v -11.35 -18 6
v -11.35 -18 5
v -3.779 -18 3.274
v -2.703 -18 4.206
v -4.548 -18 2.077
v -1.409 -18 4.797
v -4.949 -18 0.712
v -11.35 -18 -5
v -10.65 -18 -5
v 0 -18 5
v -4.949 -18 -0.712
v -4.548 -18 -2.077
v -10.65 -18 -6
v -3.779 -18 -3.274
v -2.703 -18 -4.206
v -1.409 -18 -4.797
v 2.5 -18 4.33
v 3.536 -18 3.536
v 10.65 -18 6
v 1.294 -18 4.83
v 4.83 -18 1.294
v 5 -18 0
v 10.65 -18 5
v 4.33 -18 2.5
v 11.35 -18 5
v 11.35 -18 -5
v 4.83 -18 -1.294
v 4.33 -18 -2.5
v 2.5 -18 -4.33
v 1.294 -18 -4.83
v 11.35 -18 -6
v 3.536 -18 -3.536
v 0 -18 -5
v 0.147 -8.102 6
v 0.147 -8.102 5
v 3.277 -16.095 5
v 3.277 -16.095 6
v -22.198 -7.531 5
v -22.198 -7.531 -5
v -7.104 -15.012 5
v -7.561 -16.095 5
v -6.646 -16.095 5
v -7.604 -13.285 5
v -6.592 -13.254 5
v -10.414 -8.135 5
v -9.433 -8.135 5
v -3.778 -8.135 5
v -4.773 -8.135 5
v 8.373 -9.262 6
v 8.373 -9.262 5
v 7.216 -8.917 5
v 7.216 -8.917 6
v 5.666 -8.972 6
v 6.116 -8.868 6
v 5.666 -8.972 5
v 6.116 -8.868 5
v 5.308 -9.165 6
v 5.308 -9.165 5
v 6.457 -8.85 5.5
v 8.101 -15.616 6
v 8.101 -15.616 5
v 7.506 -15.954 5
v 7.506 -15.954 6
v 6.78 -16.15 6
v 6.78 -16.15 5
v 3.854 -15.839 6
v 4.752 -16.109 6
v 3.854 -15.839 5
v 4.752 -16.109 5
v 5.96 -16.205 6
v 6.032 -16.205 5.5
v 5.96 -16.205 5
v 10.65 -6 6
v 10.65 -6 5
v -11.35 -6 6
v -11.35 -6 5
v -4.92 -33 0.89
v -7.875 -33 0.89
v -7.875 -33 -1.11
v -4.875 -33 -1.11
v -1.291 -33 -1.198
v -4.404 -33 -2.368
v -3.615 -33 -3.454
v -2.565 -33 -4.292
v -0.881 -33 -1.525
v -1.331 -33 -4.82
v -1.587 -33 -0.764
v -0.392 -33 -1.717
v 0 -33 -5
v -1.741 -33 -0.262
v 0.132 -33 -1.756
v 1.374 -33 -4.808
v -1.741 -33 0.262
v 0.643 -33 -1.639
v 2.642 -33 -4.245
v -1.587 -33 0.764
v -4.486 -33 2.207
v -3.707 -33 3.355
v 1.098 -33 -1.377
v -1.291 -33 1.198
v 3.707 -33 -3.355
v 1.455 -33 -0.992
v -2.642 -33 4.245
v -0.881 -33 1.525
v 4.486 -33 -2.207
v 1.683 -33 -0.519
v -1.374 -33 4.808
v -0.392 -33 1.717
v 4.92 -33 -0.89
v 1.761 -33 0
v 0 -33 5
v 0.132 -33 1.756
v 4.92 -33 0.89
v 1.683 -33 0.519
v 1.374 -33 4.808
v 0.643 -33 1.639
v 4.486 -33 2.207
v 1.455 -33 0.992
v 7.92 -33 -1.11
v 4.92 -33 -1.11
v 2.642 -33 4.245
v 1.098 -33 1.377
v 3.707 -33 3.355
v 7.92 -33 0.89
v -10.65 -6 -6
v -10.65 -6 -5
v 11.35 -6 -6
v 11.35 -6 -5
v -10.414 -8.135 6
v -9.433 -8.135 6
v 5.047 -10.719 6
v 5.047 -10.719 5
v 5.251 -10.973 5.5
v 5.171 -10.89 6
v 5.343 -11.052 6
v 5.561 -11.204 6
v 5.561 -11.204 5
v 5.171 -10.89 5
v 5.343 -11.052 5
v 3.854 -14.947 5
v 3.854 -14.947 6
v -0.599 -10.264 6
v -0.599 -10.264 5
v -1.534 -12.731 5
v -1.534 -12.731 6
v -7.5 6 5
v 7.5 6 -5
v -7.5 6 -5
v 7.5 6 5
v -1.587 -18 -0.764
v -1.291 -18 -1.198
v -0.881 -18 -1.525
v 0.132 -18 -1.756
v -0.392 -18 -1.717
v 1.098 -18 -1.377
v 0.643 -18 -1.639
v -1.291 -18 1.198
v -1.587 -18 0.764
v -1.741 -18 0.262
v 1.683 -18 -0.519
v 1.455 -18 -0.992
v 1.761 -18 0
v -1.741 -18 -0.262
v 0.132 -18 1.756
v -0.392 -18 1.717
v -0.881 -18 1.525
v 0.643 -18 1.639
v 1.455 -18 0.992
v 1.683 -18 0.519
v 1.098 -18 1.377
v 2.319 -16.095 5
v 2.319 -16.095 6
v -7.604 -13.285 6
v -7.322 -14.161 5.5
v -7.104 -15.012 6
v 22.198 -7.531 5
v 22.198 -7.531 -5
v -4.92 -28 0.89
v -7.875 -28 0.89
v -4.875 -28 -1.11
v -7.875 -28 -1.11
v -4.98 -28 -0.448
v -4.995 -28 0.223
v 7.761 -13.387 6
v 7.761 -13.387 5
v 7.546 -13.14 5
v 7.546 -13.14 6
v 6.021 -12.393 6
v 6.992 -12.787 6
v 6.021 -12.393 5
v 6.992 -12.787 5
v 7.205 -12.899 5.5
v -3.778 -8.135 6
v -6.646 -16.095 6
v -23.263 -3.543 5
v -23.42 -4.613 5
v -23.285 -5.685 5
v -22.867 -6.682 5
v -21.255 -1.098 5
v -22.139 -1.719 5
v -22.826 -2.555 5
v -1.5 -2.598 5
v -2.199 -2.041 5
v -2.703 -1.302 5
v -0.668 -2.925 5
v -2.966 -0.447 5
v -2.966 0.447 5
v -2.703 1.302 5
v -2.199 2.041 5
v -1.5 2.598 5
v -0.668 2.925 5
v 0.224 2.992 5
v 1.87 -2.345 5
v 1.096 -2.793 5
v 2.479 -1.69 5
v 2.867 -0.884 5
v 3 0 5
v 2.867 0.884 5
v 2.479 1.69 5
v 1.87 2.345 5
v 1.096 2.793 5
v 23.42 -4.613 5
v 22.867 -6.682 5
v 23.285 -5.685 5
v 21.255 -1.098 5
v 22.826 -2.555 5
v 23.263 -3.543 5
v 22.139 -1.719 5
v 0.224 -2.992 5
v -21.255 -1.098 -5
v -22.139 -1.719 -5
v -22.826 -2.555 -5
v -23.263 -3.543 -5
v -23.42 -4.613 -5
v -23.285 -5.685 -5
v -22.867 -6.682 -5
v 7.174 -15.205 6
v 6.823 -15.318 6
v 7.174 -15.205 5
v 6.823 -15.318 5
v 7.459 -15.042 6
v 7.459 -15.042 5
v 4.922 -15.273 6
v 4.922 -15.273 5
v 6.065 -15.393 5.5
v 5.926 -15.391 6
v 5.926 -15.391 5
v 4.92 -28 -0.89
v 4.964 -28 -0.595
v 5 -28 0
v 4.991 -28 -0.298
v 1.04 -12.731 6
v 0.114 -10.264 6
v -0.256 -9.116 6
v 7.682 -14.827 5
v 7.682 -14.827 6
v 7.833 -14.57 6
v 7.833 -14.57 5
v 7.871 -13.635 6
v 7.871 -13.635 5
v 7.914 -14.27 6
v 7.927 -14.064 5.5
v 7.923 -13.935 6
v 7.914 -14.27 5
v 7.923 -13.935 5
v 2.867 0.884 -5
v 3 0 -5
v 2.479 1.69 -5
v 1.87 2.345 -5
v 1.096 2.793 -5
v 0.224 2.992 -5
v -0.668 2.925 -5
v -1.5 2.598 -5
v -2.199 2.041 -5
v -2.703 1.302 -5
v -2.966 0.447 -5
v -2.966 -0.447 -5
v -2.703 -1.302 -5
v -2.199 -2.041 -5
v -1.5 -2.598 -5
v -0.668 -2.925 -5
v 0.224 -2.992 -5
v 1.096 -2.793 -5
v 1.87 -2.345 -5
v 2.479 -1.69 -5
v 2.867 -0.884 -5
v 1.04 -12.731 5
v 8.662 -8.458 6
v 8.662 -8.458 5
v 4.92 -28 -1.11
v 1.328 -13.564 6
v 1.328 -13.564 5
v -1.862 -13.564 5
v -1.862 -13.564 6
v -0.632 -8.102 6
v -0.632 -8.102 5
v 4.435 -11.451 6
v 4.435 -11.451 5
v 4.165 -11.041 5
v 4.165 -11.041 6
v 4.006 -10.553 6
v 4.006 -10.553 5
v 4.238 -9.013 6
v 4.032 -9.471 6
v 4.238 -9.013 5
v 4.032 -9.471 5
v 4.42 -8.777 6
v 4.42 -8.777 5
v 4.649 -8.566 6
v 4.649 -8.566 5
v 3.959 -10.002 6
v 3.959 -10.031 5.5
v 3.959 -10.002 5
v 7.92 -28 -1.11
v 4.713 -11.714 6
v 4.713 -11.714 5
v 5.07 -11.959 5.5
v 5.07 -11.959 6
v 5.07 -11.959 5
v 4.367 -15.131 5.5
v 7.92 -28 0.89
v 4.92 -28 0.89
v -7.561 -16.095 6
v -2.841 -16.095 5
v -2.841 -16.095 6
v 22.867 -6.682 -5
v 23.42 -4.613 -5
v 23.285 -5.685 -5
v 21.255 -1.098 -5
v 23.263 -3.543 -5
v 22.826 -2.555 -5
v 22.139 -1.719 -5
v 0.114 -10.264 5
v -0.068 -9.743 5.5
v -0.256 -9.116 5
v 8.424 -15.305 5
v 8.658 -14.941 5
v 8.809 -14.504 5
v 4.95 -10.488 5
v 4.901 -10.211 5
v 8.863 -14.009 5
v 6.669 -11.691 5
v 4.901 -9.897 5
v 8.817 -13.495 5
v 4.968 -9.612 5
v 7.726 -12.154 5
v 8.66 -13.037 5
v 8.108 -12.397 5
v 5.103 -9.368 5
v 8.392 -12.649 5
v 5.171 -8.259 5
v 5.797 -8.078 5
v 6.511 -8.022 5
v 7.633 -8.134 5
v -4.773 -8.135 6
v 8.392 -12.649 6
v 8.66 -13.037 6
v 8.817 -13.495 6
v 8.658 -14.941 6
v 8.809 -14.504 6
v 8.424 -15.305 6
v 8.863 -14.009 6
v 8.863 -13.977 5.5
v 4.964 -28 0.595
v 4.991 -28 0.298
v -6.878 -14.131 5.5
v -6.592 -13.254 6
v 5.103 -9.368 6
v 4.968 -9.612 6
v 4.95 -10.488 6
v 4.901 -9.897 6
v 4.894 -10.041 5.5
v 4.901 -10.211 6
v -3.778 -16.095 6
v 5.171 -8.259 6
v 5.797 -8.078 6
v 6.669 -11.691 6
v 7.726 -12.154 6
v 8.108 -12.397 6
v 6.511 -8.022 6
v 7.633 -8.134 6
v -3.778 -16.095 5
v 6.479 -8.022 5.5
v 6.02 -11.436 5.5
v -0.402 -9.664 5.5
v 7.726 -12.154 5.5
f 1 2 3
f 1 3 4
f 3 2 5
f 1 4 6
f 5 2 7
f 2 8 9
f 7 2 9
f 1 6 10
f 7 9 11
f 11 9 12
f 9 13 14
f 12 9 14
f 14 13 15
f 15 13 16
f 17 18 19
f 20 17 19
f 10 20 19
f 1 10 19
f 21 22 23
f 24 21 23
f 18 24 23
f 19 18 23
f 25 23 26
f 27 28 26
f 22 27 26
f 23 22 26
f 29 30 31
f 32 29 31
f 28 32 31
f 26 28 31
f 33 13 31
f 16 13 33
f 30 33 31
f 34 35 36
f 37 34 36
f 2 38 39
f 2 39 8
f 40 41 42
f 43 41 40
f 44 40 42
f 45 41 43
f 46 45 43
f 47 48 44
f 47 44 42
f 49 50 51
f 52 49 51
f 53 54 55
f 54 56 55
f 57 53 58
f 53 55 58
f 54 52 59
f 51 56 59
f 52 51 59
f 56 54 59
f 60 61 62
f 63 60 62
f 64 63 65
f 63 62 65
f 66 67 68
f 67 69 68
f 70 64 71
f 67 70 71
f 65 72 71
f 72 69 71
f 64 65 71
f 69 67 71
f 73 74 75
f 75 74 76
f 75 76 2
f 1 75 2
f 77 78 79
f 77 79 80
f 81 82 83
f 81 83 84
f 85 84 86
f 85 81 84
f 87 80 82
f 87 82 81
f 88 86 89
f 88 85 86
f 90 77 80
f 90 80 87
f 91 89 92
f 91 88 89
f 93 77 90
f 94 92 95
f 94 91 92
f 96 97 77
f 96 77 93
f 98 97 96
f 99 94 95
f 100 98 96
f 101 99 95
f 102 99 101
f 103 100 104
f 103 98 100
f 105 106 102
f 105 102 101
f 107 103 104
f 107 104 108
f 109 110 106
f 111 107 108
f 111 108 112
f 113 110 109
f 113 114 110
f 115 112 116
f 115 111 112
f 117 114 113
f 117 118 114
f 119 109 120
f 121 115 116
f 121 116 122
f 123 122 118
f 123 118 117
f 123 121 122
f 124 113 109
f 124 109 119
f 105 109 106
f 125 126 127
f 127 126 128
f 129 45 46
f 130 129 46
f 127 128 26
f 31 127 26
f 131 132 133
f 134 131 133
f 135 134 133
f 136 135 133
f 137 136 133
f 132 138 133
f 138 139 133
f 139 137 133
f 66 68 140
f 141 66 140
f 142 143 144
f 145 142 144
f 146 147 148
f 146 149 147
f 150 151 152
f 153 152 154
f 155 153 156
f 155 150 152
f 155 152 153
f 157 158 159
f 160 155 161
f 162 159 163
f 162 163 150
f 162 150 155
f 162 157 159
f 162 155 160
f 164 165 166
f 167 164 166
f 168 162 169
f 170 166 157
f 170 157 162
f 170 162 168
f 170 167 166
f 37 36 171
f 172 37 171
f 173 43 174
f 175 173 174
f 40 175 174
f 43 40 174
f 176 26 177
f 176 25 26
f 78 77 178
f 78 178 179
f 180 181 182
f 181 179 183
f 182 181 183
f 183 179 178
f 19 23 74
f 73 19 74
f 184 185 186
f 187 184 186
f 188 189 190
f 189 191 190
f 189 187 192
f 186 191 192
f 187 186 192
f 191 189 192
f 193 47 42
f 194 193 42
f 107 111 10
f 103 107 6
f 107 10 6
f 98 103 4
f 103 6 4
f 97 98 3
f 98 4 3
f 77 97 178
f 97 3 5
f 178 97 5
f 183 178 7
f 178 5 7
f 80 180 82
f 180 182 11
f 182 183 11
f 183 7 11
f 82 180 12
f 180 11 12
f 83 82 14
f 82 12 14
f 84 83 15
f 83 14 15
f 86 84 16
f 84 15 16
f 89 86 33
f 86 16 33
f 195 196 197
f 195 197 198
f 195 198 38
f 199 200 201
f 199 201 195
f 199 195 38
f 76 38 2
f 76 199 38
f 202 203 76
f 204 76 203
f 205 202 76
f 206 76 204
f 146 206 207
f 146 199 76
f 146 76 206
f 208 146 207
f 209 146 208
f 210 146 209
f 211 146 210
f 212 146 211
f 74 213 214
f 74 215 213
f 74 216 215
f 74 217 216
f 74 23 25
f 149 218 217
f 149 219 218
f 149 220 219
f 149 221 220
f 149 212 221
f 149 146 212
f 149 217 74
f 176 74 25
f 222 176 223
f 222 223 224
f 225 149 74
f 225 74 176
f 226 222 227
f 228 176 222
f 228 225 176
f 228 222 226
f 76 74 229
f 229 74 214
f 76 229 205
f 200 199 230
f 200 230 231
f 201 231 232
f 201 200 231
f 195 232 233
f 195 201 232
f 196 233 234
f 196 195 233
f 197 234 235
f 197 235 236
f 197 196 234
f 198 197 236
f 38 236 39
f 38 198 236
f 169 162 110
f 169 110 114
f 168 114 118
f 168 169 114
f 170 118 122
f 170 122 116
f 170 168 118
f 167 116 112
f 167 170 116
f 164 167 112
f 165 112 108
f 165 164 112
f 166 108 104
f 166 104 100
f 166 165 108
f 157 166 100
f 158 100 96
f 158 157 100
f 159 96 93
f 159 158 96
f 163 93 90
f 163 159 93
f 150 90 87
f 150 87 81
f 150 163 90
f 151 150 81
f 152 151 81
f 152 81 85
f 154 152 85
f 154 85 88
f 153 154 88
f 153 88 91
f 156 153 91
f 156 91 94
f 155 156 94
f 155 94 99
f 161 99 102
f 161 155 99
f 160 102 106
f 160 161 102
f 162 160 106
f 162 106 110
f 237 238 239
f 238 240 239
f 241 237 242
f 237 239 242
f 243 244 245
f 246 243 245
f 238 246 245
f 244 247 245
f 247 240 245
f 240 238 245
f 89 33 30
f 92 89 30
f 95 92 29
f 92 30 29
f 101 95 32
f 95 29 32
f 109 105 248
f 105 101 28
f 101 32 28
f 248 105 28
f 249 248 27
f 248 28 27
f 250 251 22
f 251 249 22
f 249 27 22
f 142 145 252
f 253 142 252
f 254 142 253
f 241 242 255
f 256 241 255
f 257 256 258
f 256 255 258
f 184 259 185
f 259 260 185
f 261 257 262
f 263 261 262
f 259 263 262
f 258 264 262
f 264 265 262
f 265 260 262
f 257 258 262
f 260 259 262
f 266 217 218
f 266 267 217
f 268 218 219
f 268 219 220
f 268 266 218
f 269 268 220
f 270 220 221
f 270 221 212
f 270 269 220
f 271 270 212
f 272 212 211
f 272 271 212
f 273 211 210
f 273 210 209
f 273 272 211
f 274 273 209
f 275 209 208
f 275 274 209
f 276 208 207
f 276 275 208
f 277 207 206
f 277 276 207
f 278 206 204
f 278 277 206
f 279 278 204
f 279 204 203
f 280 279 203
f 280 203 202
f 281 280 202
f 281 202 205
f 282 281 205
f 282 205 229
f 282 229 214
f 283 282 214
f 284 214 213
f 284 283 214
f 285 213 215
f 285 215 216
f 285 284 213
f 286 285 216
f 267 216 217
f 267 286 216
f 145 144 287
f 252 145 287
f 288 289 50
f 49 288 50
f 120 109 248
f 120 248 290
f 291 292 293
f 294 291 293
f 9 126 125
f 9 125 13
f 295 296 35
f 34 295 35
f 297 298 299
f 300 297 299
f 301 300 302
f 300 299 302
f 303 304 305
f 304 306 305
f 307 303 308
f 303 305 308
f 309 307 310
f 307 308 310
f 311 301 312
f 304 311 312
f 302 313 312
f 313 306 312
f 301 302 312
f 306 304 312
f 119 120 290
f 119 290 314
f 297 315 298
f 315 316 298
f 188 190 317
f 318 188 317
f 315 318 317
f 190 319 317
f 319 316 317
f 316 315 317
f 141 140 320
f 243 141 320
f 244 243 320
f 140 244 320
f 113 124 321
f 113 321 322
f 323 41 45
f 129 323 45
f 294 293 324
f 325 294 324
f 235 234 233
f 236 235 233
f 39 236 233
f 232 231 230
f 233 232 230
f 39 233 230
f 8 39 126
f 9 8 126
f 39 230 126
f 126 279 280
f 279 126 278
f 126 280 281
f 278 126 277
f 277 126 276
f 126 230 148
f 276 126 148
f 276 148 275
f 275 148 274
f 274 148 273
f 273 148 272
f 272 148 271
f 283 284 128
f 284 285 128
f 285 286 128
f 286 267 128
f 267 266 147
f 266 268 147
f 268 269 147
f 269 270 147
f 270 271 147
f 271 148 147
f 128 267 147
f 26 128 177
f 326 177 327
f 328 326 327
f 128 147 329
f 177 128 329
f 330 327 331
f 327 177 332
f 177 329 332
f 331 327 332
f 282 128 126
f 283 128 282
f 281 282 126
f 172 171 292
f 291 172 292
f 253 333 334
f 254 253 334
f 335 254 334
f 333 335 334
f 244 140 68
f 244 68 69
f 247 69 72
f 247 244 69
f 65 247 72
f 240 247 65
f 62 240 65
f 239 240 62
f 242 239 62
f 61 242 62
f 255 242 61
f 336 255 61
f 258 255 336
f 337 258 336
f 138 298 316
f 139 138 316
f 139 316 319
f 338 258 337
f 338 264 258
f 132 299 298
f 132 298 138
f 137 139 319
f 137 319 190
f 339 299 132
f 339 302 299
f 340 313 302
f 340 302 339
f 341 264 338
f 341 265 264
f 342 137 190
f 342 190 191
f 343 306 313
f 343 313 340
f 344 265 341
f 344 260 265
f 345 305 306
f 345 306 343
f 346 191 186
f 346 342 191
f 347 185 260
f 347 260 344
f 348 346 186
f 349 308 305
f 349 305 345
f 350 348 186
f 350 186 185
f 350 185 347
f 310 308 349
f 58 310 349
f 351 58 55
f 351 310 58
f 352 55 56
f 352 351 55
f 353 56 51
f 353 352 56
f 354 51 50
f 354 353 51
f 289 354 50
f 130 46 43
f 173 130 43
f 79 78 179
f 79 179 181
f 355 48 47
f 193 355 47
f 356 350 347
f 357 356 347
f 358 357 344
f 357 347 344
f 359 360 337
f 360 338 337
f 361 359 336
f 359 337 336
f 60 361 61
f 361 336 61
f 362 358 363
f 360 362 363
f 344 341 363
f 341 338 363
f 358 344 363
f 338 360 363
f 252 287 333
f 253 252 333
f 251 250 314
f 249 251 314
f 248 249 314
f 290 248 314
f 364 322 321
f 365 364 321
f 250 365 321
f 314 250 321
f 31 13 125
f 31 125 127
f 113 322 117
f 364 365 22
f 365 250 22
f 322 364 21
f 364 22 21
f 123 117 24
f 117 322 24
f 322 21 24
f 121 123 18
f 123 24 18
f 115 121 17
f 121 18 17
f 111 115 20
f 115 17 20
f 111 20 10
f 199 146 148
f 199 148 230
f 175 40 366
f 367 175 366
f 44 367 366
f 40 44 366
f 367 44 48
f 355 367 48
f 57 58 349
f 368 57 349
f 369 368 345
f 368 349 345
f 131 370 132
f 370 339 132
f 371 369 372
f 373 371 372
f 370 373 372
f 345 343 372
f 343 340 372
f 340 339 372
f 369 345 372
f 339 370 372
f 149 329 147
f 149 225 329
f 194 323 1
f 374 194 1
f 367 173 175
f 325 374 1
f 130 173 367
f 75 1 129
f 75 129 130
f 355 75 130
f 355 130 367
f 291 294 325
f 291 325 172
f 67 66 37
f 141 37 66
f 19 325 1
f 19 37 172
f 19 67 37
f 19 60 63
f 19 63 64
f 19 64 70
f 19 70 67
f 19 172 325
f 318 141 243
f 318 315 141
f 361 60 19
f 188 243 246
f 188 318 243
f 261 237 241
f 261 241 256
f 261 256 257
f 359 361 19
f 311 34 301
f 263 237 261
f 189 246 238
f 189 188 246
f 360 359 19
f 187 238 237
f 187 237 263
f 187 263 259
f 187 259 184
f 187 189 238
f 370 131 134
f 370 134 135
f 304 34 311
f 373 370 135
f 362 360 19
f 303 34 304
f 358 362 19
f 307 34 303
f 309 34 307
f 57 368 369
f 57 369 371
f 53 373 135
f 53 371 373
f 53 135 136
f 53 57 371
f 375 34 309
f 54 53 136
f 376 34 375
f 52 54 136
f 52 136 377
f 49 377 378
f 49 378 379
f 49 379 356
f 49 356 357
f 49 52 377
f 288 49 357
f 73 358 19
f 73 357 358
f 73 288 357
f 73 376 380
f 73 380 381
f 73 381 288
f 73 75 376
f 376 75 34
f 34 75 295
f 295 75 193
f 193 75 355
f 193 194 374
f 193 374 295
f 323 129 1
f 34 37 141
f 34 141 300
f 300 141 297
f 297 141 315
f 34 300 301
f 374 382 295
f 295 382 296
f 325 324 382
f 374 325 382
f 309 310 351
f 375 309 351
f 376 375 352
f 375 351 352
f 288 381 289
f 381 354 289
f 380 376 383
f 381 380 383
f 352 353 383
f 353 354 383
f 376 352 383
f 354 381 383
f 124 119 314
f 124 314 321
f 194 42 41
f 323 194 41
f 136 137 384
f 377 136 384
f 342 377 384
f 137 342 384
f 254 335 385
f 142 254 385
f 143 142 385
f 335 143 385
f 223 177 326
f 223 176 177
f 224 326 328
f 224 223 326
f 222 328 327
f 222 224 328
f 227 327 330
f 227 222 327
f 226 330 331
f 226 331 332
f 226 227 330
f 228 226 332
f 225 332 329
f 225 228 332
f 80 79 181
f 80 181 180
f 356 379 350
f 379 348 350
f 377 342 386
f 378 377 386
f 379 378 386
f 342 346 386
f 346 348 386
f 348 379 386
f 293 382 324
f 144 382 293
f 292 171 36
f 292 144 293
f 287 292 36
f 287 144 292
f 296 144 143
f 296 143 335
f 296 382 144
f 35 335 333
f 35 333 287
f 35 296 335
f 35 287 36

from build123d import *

# Parameters (mm, degrees)
F0_R      = 3
F1_DEPTH  = 5
F2_R      = 1.7610809182
F3_DEPTH  = 15
F5_DEPTH  = 5
F6_W      = 22
F6_H      = 12
F7_DEPTH  = 1
F9_DEPTH  = 1
F10_DEPTH = 1


with BuildPart() as f1:
    # F0 (on Top) → F1 (new body, symmetric)
    with BuildSketch(Plane.XY):
        with BuildLine():
            Line((7.5, 6), (-7.5, 6))
            Line((-7.5, 6), (-21.2545811556, -1.0983172864))
            ThreePointArc((-21.2545811556, -1.0983172864), (-23.3778564167, -4.0725637723), (-22.1978447385, -7.5311780081))
            Line((-22.1978447385, -7.5311780081), (-11.3497786224, -18))
            Line((-11.3497786224, -18), (-5, -18))
            Line((-5, -18), (5, -18))
            Line((5, -18), (11.3497786224, -18))
            Line((11.3497786224, -18), (22.1978447385, -7.5311780081))
            ThreePointArc((22.1978447385, -7.5311780081), (23.3778564167, -4.0725637723), (21.2545811556, -1.0983172864))
            Line((21.2545811556, -1.0983172864), (7.5, 6))
        make_face()
        Circle(F0_R, mode=Mode.SUBTRACT)
    extrude(amount=F1_DEPTH, both=True)

    # F2 (on face) → F3 (join)
    with BuildSketch(Plane.XZ.offset(18)):
        with BuildLine():
            ThreePointArc((0, -5), (3.5355339059, -3.5355339059), (5, 0))
            ThreePointArc((5, 0), (3.5355339126, 3.5355338993), (1.89e-08, 5))
            ThreePointArc((1.89e-08, 5), (-5, 9.4e-09), (0, -5))
        make_face()
        Circle(F2_R, mode=Mode.SUBTRACT)
    extrude(amount=F3_DEPTH)

    # F4 (on face) → F5 (join)
    with BuildSketch(Plane.XZ.offset(33)):
        with BuildLine():
            Line((-7.8751421592, -1.1104003458), (-4.8751421592, -1.1104003458))
            ThreePointArc((-4.8751421592, -1.1104003458), (-4.9987302039, -0.1126780739), (-4.9202248379, 0.8895996542))
            Line((-4.9202248379, 0.8895996542), (-7.8751421592, 0.8895996542))
            Line((-7.8751421592, 0.8895996542), (-7.8751421592, -1.1104003458))
        make_face()
        with BuildLine():
            ThreePointArc((5, 0), (4.9800162745, -0.4465847123), (4.9202248379, -0.8895996542))
            Line((4.9202248379, -0.8895996542), (4.9202248379, -1.1104003458))
            Line((4.9202248379, -1.1104003458), (7.9202248379, -1.1104003458))
            Line((7.9202248379, -1.1104003458), (7.9202248379, 0.8895996542))
            Line((7.9202248379, 0.8895996542), (4.9202248379, 0.8895996542))
            ThreePointArc((4.9202248379, 0.8895996542), (4.9800162745, 0.4465847123), (5, 0))
        make_face()
    extrude(amount=-F5_DEPTH)

    # F6 (on face) → F7 (join)
    with BuildSketch(Plane(origin=(0, 0, -5), x_dir=(1, 0, 0), z_dir=(0, 0, -1))):
        with Locations((0.3497786224, 12)):
            Rectangle(F6_W, F6_H)
    extrude(amount=F7_DEPTH)

    # F8 (on face) → F9 (join)
    with BuildSketch(Plane.XY.offset(5)):
        Polygon((-11.3497786224, -6), (-11.3497786224, -18), (1.08e-08, -18), (10.6502213776, -18), (10.6502213776, -6), align=None)
        with BuildLine():
            Line((-6.5919761548, -13.2537334136), (-4.7731608238, -8.1352665147))
            Line((-4.7731608238, -8.1352665147), (-3.7783873047, -8.1352665147))
            Line((-3.7783873047, -8.1352665147), (-6.6459831235, -16.0951968282))
            Line((-6.6459831235, -16.0951968282), (-7.5606172698, -16.0951968282))
            Line((-7.5606172698, -16.0951968282), (-10.4142758064, -8.1352665147))
            Line((-10.4142758064, -8.1352665147), (-9.4334395695, -8.1352665147))
            Line((-9.4334395695, -8.1352665147), (-7.6041712768, -13.2850922986))
            add(Edge.make_bspline(
                [(-7.6041712768, -13.2850922986), (-7.2888402663, -14.1735940408), (-7.1041712768, -15.0115731349)],
                knots=[0, 0, 0, 1, 1, 1], degree=2))
            add(Edge.make_bspline(
                [(-7.1041712768, -15.0115731349), (-6.9073071653, -14.1300400338), (-6.5919761548, -13.2537334136)],
                knots=[0, 0, 0, 1, 1, 1], degree=2))
        make_face(mode=Mode.SUBTRACT)
        Polygon((3.2773618243, -16.0951968282), (2.319173671, -16.0951968282), (1.3278844723, -13.5638379432), (-1.862010998, -13.5638379432), (-2.8411050747, -16.0951968282), (-3.7783873047, -16.0951968282), (-0.6320458412, -8.1021654694), (0.1466998034, -8.1021654694), align=None, mode=Mode.SUBTRACT)
        with BuildLine():
            add(Edge.make_bspline(
                [(8.3923444027, -12.6492037969), (8.8627276779, -13.1613989188), (8.8627276779, -13.9767299293)],
                knots=[0, 0, 0, 1, 1, 1], degree=2))
            add(Edge.make_bspline(
                [(8.8627276779, -13.9767299293), (8.8627276779, -15.0272525774), (8.100532556, -15.6161027516)],
                knots=[0, 0, 0, 1, 1, 1], degree=2))
            add(Edge.make_bspline(
                [(8.100532556, -15.6161027516), (7.338337434, -16.2049529258), (6.031717225, -16.2049529258)],
                knots=[0, 0, 0, 1, 1, 1], degree=2))
            add(Edge.make_bspline(
                [(6.031717225, -16.2049529258), (4.6170830786, -16.2049529258), (3.8540168765, -15.8390992673)],
                knots=[0, 0, 0, 1, 1, 1], degree=2))
            Line((3.8540168765, -15.8390992673), (3.8540168765, -14.9471132046))
            add(Edge.make_bspline(
                [(3.8540168765, -14.9471132046), (4.3453060751, -15.1526881174), (4.9219611274, -15.2728971767)],
                knots=[0, 0, 0, 1, 1, 1], degree=2))
            add(Edge.make_bspline(
                [(4.9219611274, -15.2728971767), (5.4986161797, -15.3931062359), (6.0648182703, -15.3931062359)],
                knots=[0, 0, 0, 1, 1, 1], degree=2))
            add(Edge.make_bspline(
                [(6.0648182703, -15.3931062359), (6.9899053783, -15.3931062359), (7.4585464933, -15.0420609397)],
                knots=[0, 0, 0, 1, 1, 1], degree=2))
            add(Edge.make_bspline(
                [(7.4585464933, -15.0420609397), (7.9271876082, -14.6910156436), (7.9271876082, -14.0638379432)],
                knots=[0, 0, 0, 1, 1, 1], degree=2))
            add(Edge.make_bspline(
                [(7.9271876082, -14.0638379432), (7.9271876082, -13.6509459572), (7.7608113016, -13.3870086749)],
                knots=[0, 0, 0, 1, 1, 1], degree=2))
            add(Edge.make_bspline(
                [(7.7608113016, -13.3870086749), (7.594434995, -13.1230713927), (7.2050621727, -12.8992037969)],
                knots=[0, 0, 0, 1, 1, 1], degree=2))
            add(Edge.make_bspline(
                [(7.2050621727, -12.8992037969), (6.8156893504, -12.6753362011), (6.0212642633, -12.3931062359)],
                knots=[0, 0, 0, 1, 1, 1], degree=2))
            add(Edge.make_bspline(
                [(6.0212642633, -12.3931062359), (4.9115081657, -11.9958936924), (4.4350273295, -11.4514686052)],
                knots=[0, 0, 0, 1, 1, 1], degree=2))
            add(Edge.make_bspline(
                [(4.4350273295, -11.4514686052), (3.9585464933, -10.9070435181), (3.9585464933, -10.0307368979)],
                knots=[0, 0, 0, 1, 1, 1], degree=2))
            add(Edge.make_bspline(
                [(3.9585464933, -10.0307368979), (3.9585464933, -9.1108762708), (4.6493130438, -8.5664511836)],
                knots=[0, 0, 0, 1, 1, 1], degree=2))
            add(Edge.make_bspline(
                [(4.6493130438, -8.5664511836), (5.3400795943, -8.0220260965), (6.4794524166, -8.0220260965)],
                knots=[0, 0, 0, 1, 1, 1], degree=2))
            add(Edge.make_bspline(
                [(6.4794524166, -8.0220260965), (7.6658635664, -8.0220260965), (8.6623792459, -8.4575661662)],
                knots=[0, 0, 0, 1, 1, 1], degree=2))
            Line((8.6623792459, -8.4575661662), (8.3731806396, -9.262444215))
            add(Edge.make_bspline(
                [(8.3731806396, -9.262444215), (7.3871179218, -8.8495522289), (6.456804333, -8.8495522289)],
                knots=[0, 0, 0, 1, 1, 1], degree=2))
            add(Edge.make_bspline(
                [(6.456804333, -8.8495522289), (5.7216126953, -8.8495522289), (5.3078496291, -9.1648832394)],
                knots=[0, 0, 0, 1, 1, 1], degree=2))
            add(Edge.make_bspline(
                [(5.3078496291, -9.1648832394), (4.8940865629, -9.4802142498), (4.8940865629, -10.0411898596)],
                knots=[0, 0, 0, 1, 1, 1], degree=2))
            add(Edge.make_bspline(
                [(4.8940865629, -10.0411898596), (4.8940865629, -10.4540818457), (5.0465255873, -10.718890208)],
                knots=[0, 0, 0, 1, 1, 1], degree=2))
            add(Edge.make_bspline(
                [(5.0465255873, -10.718890208), (5.1989646117, -10.9836985704), (5.5613339497, -11.2040818457)],
                knots=[0, 0, 0, 1, 1, 1], degree=2))
            add(Edge.make_bspline(
                [(5.5613339497, -11.2040818457), (5.9237032877, -11.4244651209), (6.669347887, -11.6910156436)],
                knots=[0, 0, 0, 1, 1, 1], degree=2))
            add(Edge.make_bspline(
                [(6.669347887, -11.6910156436), (7.9219611274, -12.1370086749), (8.3923444027, -12.6492037969)],
                knots=[0, 0, 0, 1, 1, 1], degree=2))
        make_face(mode=Mode.SUBTRACT)
    extrude(amount=F9_DEPTH)

    # F8 (on face) → F10 (join)
    with BuildSketch(Plane.XY.offset(5)):
        with BuildLine():
            Line((-1.5344848656, -12.73108533), (1.0404280264, -12.73108533))
            Line((1.0404280264, -12.73108533), (0.1135987581, -10.2641863753))
            add(Edge.make_bspline(
                [(0.1135987581, -10.2641863753), (-0.0658437506, -9.7955452603), (-0.255739221, -9.1161027516)],
                knots=[0, 0, 0, 1, 1, 1], degree=2))
            add(Edge.make_bspline(
                [(-0.255739221, -9.1161027516), (-0.3759482803, -9.6387508352), (-0.5989447959, -10.2641863753)],
                knots=[0, 0, 0, 1, 1, 1], degree=2))
            Line((-0.5989447959, -10.2641863753), (-1.5344848656, -12.73108533))
        make_face()
    extrude(amount=F10_DEPTH)


solid = f1.part
